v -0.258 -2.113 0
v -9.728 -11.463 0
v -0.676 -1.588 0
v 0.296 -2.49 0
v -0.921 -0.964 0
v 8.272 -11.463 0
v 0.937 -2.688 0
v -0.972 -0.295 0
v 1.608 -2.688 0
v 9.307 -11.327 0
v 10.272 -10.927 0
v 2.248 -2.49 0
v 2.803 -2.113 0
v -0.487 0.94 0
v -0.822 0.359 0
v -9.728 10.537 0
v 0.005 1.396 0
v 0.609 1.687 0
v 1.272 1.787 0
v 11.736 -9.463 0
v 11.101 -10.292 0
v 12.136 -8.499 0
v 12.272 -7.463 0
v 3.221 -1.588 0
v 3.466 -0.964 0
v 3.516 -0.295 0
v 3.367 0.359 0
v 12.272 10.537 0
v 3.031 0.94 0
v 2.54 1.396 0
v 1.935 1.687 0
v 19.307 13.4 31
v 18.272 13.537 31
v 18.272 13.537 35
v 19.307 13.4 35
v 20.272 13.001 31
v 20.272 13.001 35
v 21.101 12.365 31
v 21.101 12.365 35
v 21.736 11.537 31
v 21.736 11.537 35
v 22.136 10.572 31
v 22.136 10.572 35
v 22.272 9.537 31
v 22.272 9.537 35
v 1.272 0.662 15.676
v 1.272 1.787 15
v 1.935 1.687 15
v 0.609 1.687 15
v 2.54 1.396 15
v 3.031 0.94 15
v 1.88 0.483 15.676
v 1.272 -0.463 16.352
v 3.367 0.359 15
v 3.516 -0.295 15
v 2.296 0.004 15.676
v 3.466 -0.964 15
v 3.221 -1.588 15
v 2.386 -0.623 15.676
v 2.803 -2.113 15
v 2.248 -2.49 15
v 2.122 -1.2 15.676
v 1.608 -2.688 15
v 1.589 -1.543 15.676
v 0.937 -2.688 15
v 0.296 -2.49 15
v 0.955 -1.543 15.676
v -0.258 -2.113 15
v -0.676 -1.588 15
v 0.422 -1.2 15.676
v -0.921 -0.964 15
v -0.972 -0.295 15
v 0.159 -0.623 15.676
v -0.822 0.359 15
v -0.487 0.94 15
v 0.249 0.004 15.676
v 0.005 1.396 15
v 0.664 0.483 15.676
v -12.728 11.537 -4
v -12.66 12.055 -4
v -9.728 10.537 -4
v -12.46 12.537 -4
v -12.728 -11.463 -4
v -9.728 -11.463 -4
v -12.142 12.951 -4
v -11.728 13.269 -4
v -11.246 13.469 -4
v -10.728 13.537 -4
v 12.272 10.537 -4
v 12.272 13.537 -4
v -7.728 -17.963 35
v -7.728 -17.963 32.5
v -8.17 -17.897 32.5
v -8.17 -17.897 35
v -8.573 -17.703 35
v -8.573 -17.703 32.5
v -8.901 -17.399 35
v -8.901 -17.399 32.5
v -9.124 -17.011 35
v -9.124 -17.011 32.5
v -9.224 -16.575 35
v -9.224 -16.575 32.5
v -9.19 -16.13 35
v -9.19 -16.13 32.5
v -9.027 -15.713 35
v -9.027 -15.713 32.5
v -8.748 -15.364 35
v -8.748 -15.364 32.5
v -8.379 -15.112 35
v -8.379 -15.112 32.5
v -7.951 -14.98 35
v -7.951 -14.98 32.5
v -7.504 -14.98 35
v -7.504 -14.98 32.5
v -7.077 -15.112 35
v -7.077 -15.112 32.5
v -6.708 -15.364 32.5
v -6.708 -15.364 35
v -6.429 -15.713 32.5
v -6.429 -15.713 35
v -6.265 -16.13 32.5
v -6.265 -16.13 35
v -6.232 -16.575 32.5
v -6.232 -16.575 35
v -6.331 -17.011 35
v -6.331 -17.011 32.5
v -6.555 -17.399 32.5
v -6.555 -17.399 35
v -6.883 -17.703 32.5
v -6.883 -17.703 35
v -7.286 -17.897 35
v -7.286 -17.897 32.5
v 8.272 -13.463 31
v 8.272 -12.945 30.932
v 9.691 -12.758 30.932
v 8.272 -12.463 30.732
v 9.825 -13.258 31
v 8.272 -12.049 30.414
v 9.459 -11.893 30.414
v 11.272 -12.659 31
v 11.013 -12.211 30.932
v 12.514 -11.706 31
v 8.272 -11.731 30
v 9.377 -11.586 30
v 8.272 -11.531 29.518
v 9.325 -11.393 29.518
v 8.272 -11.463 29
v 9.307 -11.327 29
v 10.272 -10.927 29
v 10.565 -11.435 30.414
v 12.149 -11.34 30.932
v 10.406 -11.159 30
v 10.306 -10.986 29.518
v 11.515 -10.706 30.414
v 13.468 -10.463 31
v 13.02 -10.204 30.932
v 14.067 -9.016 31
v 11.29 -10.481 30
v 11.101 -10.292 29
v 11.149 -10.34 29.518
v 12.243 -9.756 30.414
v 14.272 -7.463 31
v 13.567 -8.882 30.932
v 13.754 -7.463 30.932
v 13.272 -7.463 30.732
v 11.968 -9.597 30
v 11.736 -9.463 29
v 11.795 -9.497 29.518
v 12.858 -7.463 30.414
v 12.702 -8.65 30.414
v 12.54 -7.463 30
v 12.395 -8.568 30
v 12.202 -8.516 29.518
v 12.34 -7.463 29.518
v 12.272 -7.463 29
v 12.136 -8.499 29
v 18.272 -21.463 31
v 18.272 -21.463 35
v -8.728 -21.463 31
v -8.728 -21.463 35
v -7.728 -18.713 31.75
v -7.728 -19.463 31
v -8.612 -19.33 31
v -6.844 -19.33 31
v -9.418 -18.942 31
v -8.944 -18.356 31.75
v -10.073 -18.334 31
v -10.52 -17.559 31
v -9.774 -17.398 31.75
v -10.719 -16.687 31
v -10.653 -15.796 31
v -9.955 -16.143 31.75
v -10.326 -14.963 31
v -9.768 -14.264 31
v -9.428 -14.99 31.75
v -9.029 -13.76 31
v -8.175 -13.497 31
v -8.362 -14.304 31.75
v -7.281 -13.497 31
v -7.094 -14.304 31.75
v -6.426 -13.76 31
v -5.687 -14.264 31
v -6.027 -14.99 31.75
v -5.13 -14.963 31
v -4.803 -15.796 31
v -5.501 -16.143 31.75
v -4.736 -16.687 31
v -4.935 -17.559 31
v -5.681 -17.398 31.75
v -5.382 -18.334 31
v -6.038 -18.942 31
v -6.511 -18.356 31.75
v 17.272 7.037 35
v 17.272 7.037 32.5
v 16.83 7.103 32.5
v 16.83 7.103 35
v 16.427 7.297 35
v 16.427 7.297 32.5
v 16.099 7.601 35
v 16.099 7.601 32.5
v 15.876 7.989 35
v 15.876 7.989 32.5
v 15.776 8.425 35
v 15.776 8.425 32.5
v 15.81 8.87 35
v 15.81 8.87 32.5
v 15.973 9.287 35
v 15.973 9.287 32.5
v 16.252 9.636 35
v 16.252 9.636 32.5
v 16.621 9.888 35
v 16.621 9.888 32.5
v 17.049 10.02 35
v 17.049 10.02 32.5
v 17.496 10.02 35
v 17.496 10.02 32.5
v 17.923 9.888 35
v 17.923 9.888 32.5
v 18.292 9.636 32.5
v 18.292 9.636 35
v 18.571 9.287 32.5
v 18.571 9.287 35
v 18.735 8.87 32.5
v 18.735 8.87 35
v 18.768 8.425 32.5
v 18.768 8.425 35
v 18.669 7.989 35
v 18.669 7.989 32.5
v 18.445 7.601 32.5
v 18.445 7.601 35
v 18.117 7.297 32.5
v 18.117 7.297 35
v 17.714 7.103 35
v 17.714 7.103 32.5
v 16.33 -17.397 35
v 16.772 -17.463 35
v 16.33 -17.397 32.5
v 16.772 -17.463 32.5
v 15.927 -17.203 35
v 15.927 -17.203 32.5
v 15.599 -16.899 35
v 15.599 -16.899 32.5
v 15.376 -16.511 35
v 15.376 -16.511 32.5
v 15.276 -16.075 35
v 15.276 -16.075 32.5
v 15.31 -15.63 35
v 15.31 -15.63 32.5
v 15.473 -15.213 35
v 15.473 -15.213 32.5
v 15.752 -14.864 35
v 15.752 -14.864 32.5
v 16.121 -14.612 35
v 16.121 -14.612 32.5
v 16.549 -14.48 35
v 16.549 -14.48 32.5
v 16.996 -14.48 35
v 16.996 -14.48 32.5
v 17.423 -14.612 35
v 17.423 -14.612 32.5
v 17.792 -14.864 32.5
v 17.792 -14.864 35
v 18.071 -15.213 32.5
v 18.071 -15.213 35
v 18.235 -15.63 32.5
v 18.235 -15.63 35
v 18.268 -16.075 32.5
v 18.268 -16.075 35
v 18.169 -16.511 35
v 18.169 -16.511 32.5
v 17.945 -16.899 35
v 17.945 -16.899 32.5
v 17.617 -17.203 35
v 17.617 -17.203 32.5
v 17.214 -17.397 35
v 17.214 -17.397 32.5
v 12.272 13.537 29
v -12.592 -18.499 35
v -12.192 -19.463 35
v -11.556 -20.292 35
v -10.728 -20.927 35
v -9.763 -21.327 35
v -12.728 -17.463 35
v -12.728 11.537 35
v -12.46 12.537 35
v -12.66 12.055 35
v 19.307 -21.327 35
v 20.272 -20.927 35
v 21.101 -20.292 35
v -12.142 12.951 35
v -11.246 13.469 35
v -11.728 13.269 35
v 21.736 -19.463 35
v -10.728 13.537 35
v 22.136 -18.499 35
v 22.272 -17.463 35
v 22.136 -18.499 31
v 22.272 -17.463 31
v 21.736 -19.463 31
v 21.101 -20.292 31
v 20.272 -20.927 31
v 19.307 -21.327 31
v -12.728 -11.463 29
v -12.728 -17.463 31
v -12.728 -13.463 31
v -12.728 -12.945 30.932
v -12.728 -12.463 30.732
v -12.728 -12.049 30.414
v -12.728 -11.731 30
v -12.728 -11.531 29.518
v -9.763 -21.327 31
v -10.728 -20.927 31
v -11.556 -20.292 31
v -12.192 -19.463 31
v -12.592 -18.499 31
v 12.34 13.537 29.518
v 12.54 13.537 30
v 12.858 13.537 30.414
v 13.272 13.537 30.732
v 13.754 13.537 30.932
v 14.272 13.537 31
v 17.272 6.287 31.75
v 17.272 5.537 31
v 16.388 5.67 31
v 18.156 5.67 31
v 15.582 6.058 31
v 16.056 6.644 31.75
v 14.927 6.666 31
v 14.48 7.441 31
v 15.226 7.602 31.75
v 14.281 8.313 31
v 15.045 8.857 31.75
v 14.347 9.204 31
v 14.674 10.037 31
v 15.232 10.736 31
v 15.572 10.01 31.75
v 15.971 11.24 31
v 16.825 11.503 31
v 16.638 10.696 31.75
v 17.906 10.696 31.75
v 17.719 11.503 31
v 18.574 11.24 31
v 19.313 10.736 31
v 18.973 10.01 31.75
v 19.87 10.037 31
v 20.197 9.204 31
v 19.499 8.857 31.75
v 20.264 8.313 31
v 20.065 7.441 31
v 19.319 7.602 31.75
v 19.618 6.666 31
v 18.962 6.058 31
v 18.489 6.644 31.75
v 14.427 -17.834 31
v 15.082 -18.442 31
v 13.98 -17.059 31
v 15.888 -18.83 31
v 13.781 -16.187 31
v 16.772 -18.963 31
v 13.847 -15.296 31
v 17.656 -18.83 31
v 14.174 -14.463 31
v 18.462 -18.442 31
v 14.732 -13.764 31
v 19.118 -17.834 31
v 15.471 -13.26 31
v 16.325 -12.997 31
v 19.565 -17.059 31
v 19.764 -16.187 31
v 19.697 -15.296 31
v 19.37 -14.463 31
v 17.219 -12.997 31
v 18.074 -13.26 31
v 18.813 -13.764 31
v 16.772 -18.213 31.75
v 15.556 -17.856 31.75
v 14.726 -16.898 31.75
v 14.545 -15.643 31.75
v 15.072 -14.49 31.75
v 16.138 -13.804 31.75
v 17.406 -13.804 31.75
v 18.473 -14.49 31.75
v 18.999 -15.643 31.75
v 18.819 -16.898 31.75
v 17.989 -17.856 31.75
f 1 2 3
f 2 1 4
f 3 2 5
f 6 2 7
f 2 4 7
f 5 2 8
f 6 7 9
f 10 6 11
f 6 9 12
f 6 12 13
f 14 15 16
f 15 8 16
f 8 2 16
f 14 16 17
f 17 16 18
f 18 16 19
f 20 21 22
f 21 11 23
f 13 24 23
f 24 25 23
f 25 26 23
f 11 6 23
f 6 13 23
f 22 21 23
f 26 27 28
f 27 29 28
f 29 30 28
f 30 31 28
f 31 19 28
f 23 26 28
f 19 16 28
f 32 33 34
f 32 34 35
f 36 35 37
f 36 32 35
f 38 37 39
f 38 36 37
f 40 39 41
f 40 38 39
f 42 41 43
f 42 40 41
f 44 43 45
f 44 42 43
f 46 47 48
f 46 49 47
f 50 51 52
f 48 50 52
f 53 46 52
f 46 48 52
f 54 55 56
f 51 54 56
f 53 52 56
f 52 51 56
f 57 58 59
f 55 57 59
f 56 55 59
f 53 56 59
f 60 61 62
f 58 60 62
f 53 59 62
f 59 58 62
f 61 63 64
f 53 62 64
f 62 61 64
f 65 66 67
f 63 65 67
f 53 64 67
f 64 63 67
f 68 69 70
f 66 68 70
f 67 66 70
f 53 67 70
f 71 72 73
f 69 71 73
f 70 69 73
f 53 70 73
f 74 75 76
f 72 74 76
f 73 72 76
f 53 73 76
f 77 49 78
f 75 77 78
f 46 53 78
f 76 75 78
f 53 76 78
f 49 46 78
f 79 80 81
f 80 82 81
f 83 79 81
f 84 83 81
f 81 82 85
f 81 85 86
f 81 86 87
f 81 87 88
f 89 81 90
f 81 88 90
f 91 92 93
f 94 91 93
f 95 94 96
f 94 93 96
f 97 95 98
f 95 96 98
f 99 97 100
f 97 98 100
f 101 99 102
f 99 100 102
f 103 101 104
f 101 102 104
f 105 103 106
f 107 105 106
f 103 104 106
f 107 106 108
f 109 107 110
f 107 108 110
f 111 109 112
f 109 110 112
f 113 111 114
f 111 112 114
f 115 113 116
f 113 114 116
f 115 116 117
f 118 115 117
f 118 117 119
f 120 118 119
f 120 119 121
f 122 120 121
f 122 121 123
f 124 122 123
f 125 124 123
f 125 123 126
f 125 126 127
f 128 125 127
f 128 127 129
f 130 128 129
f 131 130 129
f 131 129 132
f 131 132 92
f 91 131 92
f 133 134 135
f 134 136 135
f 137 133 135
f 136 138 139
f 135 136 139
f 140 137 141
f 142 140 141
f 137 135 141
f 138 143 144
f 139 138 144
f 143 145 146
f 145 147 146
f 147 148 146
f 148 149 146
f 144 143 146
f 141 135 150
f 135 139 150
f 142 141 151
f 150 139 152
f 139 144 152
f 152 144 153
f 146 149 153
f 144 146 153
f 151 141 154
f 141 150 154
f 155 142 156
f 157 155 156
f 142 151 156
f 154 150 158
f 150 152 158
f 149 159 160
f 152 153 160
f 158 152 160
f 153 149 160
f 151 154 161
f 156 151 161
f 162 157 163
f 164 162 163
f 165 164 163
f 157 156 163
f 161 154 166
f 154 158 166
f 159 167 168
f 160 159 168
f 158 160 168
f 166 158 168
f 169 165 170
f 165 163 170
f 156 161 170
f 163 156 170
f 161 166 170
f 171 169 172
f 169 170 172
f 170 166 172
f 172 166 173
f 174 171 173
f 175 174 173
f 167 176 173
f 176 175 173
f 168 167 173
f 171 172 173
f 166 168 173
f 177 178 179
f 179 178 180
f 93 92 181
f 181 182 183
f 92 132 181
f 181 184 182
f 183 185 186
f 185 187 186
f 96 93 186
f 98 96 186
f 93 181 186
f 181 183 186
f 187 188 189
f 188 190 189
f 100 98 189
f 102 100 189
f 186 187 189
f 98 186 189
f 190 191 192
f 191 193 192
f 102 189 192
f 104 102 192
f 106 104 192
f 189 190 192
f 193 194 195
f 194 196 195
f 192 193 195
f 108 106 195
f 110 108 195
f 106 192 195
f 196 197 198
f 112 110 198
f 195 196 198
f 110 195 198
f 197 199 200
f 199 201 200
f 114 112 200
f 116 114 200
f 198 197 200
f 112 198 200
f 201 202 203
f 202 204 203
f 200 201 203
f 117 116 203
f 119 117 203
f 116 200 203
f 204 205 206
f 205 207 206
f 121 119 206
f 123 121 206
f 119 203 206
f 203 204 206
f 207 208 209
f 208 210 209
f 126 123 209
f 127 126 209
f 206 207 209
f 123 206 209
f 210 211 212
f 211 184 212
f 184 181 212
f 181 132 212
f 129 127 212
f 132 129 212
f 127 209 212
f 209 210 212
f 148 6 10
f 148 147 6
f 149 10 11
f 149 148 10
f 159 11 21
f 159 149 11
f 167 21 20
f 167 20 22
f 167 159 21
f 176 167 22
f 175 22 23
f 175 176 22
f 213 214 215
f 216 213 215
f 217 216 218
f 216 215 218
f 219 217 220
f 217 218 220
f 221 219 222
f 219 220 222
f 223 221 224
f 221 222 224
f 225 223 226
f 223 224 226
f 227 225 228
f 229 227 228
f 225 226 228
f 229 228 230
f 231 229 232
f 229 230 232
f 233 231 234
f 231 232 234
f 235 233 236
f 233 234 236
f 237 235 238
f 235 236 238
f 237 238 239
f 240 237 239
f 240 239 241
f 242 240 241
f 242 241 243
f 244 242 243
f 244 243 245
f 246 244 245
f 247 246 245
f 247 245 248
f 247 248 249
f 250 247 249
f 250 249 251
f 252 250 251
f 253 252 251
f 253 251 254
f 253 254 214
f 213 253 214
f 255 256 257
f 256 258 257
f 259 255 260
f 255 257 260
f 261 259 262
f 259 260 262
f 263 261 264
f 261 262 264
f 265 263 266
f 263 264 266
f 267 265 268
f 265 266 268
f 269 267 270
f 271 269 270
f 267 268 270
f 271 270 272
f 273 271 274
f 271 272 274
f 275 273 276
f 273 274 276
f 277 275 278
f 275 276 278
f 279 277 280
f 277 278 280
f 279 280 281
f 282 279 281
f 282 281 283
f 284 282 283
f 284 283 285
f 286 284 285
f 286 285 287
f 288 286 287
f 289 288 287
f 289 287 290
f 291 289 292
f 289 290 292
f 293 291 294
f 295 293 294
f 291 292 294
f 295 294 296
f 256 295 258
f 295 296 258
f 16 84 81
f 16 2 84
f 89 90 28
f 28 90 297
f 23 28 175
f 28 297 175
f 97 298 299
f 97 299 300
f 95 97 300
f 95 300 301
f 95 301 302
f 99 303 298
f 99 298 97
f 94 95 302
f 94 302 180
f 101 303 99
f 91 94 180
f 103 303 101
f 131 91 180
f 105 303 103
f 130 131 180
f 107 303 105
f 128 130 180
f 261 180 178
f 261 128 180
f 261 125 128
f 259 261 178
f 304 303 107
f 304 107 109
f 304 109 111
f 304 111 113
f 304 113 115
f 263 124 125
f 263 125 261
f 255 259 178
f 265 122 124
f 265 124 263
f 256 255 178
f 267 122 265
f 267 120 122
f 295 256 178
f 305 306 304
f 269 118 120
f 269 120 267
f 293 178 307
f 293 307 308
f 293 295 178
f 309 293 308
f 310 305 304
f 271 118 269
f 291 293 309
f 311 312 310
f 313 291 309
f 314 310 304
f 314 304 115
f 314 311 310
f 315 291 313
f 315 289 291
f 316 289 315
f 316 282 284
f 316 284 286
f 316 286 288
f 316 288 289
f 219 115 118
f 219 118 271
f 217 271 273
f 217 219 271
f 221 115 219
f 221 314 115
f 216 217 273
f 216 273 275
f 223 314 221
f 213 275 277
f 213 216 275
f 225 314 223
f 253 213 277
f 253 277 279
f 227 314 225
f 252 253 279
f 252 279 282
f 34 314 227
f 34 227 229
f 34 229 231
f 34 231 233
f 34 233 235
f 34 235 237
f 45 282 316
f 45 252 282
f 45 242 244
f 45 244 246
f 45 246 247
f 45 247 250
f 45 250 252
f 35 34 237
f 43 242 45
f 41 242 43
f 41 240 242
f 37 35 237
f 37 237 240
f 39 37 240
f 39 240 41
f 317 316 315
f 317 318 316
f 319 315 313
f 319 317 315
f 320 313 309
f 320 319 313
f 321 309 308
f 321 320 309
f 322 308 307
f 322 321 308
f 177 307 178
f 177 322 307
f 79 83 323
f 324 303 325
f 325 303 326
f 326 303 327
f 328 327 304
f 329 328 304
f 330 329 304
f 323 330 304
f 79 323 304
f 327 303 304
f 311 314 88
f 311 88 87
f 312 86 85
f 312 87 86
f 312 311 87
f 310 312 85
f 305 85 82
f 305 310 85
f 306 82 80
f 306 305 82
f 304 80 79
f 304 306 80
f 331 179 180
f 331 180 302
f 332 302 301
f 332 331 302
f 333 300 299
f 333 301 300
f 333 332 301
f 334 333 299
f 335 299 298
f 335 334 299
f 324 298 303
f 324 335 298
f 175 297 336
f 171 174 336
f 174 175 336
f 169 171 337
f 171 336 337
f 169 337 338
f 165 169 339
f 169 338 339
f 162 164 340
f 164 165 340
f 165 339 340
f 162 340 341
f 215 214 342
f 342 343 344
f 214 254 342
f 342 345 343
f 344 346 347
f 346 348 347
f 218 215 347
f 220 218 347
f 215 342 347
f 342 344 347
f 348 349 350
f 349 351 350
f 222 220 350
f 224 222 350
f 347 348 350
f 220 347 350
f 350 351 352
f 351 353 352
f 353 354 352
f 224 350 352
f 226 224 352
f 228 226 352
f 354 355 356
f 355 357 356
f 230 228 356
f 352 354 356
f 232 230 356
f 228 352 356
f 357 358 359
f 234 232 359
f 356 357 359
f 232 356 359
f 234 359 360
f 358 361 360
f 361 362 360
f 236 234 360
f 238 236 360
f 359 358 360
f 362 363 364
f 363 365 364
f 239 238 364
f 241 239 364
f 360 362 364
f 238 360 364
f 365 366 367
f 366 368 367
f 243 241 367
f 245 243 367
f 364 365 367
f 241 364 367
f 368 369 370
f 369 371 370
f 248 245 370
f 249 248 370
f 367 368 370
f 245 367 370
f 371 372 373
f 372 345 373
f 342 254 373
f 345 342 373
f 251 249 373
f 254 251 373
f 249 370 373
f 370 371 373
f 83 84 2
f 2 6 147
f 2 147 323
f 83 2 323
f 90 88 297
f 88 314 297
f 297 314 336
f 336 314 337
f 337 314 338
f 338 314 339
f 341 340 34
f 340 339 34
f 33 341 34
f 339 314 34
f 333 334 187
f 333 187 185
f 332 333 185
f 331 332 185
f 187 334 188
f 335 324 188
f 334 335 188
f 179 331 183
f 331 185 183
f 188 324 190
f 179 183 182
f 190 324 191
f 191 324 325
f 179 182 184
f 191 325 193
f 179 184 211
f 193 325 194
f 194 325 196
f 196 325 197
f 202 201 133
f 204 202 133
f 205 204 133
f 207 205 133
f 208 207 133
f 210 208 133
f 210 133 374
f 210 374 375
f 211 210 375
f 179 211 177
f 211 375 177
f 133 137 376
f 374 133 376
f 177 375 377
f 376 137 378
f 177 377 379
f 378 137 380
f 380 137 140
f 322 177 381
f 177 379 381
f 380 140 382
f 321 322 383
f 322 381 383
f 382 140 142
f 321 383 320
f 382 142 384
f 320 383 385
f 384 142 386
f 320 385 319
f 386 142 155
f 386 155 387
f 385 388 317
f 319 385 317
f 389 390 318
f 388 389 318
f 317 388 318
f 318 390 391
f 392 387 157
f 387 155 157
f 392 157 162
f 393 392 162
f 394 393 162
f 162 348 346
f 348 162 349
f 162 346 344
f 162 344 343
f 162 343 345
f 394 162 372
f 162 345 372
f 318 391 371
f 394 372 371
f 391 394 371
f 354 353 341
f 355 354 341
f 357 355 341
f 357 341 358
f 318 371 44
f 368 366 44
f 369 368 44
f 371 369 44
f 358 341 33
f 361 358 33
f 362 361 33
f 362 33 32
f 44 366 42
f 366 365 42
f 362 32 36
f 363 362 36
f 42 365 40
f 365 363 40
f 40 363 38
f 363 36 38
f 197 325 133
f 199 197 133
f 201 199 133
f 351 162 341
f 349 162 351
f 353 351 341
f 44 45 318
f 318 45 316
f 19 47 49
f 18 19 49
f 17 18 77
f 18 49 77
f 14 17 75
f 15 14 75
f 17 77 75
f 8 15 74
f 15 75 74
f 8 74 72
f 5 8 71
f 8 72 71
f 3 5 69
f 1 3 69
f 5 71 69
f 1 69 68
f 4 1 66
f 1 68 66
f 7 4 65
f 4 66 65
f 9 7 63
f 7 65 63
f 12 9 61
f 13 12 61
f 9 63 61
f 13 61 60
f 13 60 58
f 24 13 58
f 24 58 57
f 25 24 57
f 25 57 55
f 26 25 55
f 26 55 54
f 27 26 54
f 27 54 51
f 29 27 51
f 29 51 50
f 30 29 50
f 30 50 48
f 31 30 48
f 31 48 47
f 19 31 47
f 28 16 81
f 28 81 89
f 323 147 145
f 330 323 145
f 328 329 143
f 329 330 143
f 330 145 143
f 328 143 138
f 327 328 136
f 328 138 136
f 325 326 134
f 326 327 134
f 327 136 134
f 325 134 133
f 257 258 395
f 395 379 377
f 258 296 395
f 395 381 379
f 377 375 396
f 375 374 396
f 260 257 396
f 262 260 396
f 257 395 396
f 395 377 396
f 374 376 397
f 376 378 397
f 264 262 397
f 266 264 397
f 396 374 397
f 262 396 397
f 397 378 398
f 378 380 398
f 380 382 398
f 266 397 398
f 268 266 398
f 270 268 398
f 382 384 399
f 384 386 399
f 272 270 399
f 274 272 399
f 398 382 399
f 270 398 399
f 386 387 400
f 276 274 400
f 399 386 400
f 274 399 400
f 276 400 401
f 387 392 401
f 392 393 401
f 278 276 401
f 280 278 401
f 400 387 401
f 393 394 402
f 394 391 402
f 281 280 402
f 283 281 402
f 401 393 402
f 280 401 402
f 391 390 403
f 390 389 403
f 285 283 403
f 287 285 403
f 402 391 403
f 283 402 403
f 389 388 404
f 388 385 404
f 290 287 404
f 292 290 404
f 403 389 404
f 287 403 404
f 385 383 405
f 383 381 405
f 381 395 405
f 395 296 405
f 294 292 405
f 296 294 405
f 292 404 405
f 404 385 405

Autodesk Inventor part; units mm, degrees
ref_plane "YZ Plane" through (0, 0, 0) normal (1, 0, 0) x (0, 1, 0)
ref_plane "XZ Plane" through (0, 0, 0) normal (0, 1, 0) x (-1, 0, 0)
ref_plane "XY Plane" through (0, 0, 0) normal (0, 0, 1) x (1, 0, 0)
sketch "Sketch1" plane through (0, 0, 0) normal (0, 0, 1) x (1, 0, 0)
  line L0 (-12.7278, 13.5367) -> (12.2722, 13.5367)
  line L1 (12.2722, 13.5367) -> (12.2722, -11.4633)
  line L2 (12.2722, -11.4633) -> (-12.7278, -11.4633)
  line L3 (-12.7278, -11.4633) -> (-12.7278, 13.5367)
  line L4 (-9.7278, -11.4633) -> (-9.7278, 10.5367)
  line L5 (-9.7278, 10.5367) -> (12.2722, 10.5367)
  point P0 (0, 0)
  point P1 (1.2722, -0.4633)
  dimension "d0" = 25
  dimension "d1" = 25
  dimension "d2" = 3
  dimension "d3" = 3
  dimension "d4" = 11
  dimension "d5" = 11
extrude "Extrusion1" add sketch "Sketch1" along normal blind 35
extrude "Extrusion2" add sketch "Sketch1" against normal blind 4 contours L0 L1 L5 L4 L2 L3
hole "Hole1" at (1.2722, -0.4633, 0) direction (0, 0, 1) diameter 4.5 depth 15 tip angle 118
sketch "Sketch2" plane through (0, 0, 35) normal (0, 0, 1) x (1, 0, 0)
  line L0 (-12.7278, 13.5367) -> (-12.7278, -11.4633) projected
  line L1 (-12.7278, -11.4633) -> (12.2722, -11.4633) projected
  line L2 (12.2722, -11.4633) -> (12.2722, 13.5367) projected
  line L3 (12.2722, 13.5367) -> (-12.7278, 13.5367) projected
  line L4 (12.2722, 13.5367) -> (12.2722, 10.5367) projected
  line L5 (12.2722, 13.5367) -> (22.2722, 13.5367)
  line L6 (22.2722, 13.5367) -> (22.2722, -21.4633)
  line L7 (22.2722, -21.4633) -> (-12.7278, -21.4633)
  line L8 (-12.7278, -21.4633) -> (-12.7278, -11.4633)
  point P0 (0, 0)
  point P1 (17.2722, 8.5367)
  point P2 (-7.7278, -16.4633)
  point P3 (16.7722, -15.9633)
  dimension "d17" = 10
  dimension "d18" = 10
  dimension "d21" = 5
  dimension "d22" = 5
  dimension "d23" = 5.5
  dimension "d24" = 5.5
  dimension "d25" = 5
  dimension "d26" = 5
extrude "Extrusion3" add sketch "Sketch2" against normal blind 4 contours L1 L2 L5 L6 L7 L8
hole "Hole2" at (17.2722, 8.5367, 35) at (-7.7278, -16.4633, 35) at (16.7722, -15.9633, 35) direction (0, 0, -1) diameter 3 end through all
chamfer "Chamfer1" distance 1.5 angle 45 3 edges at (-7.7278, -14.9633, 31) (16.7722, -14.4633, 31) (17.2722, 10.0367, 31)
fillet "Fillet1" radius 4 4 edges at (22.2722, -21.4633, 33) (-12.7278, -21.4633, 33) (22.2722, 13.5367, 33) (12.2722, -11.4633, 15.5)
fillet "Fillet2" radius 2 3 edges at (-12.7278, 13.5367, 15.5) (12.2722, 3.0367, 31) (-2.2278, -11.4633, 31)
equation "\"d3\" = d2"
equation "\"d22\" = d21"
equation "\"d24\" = d23"
equation "\"d26\" = d25"
properties part number "3DP_PLA_Sorting_line_base_plate_standoff" material "ABS Plastic"
